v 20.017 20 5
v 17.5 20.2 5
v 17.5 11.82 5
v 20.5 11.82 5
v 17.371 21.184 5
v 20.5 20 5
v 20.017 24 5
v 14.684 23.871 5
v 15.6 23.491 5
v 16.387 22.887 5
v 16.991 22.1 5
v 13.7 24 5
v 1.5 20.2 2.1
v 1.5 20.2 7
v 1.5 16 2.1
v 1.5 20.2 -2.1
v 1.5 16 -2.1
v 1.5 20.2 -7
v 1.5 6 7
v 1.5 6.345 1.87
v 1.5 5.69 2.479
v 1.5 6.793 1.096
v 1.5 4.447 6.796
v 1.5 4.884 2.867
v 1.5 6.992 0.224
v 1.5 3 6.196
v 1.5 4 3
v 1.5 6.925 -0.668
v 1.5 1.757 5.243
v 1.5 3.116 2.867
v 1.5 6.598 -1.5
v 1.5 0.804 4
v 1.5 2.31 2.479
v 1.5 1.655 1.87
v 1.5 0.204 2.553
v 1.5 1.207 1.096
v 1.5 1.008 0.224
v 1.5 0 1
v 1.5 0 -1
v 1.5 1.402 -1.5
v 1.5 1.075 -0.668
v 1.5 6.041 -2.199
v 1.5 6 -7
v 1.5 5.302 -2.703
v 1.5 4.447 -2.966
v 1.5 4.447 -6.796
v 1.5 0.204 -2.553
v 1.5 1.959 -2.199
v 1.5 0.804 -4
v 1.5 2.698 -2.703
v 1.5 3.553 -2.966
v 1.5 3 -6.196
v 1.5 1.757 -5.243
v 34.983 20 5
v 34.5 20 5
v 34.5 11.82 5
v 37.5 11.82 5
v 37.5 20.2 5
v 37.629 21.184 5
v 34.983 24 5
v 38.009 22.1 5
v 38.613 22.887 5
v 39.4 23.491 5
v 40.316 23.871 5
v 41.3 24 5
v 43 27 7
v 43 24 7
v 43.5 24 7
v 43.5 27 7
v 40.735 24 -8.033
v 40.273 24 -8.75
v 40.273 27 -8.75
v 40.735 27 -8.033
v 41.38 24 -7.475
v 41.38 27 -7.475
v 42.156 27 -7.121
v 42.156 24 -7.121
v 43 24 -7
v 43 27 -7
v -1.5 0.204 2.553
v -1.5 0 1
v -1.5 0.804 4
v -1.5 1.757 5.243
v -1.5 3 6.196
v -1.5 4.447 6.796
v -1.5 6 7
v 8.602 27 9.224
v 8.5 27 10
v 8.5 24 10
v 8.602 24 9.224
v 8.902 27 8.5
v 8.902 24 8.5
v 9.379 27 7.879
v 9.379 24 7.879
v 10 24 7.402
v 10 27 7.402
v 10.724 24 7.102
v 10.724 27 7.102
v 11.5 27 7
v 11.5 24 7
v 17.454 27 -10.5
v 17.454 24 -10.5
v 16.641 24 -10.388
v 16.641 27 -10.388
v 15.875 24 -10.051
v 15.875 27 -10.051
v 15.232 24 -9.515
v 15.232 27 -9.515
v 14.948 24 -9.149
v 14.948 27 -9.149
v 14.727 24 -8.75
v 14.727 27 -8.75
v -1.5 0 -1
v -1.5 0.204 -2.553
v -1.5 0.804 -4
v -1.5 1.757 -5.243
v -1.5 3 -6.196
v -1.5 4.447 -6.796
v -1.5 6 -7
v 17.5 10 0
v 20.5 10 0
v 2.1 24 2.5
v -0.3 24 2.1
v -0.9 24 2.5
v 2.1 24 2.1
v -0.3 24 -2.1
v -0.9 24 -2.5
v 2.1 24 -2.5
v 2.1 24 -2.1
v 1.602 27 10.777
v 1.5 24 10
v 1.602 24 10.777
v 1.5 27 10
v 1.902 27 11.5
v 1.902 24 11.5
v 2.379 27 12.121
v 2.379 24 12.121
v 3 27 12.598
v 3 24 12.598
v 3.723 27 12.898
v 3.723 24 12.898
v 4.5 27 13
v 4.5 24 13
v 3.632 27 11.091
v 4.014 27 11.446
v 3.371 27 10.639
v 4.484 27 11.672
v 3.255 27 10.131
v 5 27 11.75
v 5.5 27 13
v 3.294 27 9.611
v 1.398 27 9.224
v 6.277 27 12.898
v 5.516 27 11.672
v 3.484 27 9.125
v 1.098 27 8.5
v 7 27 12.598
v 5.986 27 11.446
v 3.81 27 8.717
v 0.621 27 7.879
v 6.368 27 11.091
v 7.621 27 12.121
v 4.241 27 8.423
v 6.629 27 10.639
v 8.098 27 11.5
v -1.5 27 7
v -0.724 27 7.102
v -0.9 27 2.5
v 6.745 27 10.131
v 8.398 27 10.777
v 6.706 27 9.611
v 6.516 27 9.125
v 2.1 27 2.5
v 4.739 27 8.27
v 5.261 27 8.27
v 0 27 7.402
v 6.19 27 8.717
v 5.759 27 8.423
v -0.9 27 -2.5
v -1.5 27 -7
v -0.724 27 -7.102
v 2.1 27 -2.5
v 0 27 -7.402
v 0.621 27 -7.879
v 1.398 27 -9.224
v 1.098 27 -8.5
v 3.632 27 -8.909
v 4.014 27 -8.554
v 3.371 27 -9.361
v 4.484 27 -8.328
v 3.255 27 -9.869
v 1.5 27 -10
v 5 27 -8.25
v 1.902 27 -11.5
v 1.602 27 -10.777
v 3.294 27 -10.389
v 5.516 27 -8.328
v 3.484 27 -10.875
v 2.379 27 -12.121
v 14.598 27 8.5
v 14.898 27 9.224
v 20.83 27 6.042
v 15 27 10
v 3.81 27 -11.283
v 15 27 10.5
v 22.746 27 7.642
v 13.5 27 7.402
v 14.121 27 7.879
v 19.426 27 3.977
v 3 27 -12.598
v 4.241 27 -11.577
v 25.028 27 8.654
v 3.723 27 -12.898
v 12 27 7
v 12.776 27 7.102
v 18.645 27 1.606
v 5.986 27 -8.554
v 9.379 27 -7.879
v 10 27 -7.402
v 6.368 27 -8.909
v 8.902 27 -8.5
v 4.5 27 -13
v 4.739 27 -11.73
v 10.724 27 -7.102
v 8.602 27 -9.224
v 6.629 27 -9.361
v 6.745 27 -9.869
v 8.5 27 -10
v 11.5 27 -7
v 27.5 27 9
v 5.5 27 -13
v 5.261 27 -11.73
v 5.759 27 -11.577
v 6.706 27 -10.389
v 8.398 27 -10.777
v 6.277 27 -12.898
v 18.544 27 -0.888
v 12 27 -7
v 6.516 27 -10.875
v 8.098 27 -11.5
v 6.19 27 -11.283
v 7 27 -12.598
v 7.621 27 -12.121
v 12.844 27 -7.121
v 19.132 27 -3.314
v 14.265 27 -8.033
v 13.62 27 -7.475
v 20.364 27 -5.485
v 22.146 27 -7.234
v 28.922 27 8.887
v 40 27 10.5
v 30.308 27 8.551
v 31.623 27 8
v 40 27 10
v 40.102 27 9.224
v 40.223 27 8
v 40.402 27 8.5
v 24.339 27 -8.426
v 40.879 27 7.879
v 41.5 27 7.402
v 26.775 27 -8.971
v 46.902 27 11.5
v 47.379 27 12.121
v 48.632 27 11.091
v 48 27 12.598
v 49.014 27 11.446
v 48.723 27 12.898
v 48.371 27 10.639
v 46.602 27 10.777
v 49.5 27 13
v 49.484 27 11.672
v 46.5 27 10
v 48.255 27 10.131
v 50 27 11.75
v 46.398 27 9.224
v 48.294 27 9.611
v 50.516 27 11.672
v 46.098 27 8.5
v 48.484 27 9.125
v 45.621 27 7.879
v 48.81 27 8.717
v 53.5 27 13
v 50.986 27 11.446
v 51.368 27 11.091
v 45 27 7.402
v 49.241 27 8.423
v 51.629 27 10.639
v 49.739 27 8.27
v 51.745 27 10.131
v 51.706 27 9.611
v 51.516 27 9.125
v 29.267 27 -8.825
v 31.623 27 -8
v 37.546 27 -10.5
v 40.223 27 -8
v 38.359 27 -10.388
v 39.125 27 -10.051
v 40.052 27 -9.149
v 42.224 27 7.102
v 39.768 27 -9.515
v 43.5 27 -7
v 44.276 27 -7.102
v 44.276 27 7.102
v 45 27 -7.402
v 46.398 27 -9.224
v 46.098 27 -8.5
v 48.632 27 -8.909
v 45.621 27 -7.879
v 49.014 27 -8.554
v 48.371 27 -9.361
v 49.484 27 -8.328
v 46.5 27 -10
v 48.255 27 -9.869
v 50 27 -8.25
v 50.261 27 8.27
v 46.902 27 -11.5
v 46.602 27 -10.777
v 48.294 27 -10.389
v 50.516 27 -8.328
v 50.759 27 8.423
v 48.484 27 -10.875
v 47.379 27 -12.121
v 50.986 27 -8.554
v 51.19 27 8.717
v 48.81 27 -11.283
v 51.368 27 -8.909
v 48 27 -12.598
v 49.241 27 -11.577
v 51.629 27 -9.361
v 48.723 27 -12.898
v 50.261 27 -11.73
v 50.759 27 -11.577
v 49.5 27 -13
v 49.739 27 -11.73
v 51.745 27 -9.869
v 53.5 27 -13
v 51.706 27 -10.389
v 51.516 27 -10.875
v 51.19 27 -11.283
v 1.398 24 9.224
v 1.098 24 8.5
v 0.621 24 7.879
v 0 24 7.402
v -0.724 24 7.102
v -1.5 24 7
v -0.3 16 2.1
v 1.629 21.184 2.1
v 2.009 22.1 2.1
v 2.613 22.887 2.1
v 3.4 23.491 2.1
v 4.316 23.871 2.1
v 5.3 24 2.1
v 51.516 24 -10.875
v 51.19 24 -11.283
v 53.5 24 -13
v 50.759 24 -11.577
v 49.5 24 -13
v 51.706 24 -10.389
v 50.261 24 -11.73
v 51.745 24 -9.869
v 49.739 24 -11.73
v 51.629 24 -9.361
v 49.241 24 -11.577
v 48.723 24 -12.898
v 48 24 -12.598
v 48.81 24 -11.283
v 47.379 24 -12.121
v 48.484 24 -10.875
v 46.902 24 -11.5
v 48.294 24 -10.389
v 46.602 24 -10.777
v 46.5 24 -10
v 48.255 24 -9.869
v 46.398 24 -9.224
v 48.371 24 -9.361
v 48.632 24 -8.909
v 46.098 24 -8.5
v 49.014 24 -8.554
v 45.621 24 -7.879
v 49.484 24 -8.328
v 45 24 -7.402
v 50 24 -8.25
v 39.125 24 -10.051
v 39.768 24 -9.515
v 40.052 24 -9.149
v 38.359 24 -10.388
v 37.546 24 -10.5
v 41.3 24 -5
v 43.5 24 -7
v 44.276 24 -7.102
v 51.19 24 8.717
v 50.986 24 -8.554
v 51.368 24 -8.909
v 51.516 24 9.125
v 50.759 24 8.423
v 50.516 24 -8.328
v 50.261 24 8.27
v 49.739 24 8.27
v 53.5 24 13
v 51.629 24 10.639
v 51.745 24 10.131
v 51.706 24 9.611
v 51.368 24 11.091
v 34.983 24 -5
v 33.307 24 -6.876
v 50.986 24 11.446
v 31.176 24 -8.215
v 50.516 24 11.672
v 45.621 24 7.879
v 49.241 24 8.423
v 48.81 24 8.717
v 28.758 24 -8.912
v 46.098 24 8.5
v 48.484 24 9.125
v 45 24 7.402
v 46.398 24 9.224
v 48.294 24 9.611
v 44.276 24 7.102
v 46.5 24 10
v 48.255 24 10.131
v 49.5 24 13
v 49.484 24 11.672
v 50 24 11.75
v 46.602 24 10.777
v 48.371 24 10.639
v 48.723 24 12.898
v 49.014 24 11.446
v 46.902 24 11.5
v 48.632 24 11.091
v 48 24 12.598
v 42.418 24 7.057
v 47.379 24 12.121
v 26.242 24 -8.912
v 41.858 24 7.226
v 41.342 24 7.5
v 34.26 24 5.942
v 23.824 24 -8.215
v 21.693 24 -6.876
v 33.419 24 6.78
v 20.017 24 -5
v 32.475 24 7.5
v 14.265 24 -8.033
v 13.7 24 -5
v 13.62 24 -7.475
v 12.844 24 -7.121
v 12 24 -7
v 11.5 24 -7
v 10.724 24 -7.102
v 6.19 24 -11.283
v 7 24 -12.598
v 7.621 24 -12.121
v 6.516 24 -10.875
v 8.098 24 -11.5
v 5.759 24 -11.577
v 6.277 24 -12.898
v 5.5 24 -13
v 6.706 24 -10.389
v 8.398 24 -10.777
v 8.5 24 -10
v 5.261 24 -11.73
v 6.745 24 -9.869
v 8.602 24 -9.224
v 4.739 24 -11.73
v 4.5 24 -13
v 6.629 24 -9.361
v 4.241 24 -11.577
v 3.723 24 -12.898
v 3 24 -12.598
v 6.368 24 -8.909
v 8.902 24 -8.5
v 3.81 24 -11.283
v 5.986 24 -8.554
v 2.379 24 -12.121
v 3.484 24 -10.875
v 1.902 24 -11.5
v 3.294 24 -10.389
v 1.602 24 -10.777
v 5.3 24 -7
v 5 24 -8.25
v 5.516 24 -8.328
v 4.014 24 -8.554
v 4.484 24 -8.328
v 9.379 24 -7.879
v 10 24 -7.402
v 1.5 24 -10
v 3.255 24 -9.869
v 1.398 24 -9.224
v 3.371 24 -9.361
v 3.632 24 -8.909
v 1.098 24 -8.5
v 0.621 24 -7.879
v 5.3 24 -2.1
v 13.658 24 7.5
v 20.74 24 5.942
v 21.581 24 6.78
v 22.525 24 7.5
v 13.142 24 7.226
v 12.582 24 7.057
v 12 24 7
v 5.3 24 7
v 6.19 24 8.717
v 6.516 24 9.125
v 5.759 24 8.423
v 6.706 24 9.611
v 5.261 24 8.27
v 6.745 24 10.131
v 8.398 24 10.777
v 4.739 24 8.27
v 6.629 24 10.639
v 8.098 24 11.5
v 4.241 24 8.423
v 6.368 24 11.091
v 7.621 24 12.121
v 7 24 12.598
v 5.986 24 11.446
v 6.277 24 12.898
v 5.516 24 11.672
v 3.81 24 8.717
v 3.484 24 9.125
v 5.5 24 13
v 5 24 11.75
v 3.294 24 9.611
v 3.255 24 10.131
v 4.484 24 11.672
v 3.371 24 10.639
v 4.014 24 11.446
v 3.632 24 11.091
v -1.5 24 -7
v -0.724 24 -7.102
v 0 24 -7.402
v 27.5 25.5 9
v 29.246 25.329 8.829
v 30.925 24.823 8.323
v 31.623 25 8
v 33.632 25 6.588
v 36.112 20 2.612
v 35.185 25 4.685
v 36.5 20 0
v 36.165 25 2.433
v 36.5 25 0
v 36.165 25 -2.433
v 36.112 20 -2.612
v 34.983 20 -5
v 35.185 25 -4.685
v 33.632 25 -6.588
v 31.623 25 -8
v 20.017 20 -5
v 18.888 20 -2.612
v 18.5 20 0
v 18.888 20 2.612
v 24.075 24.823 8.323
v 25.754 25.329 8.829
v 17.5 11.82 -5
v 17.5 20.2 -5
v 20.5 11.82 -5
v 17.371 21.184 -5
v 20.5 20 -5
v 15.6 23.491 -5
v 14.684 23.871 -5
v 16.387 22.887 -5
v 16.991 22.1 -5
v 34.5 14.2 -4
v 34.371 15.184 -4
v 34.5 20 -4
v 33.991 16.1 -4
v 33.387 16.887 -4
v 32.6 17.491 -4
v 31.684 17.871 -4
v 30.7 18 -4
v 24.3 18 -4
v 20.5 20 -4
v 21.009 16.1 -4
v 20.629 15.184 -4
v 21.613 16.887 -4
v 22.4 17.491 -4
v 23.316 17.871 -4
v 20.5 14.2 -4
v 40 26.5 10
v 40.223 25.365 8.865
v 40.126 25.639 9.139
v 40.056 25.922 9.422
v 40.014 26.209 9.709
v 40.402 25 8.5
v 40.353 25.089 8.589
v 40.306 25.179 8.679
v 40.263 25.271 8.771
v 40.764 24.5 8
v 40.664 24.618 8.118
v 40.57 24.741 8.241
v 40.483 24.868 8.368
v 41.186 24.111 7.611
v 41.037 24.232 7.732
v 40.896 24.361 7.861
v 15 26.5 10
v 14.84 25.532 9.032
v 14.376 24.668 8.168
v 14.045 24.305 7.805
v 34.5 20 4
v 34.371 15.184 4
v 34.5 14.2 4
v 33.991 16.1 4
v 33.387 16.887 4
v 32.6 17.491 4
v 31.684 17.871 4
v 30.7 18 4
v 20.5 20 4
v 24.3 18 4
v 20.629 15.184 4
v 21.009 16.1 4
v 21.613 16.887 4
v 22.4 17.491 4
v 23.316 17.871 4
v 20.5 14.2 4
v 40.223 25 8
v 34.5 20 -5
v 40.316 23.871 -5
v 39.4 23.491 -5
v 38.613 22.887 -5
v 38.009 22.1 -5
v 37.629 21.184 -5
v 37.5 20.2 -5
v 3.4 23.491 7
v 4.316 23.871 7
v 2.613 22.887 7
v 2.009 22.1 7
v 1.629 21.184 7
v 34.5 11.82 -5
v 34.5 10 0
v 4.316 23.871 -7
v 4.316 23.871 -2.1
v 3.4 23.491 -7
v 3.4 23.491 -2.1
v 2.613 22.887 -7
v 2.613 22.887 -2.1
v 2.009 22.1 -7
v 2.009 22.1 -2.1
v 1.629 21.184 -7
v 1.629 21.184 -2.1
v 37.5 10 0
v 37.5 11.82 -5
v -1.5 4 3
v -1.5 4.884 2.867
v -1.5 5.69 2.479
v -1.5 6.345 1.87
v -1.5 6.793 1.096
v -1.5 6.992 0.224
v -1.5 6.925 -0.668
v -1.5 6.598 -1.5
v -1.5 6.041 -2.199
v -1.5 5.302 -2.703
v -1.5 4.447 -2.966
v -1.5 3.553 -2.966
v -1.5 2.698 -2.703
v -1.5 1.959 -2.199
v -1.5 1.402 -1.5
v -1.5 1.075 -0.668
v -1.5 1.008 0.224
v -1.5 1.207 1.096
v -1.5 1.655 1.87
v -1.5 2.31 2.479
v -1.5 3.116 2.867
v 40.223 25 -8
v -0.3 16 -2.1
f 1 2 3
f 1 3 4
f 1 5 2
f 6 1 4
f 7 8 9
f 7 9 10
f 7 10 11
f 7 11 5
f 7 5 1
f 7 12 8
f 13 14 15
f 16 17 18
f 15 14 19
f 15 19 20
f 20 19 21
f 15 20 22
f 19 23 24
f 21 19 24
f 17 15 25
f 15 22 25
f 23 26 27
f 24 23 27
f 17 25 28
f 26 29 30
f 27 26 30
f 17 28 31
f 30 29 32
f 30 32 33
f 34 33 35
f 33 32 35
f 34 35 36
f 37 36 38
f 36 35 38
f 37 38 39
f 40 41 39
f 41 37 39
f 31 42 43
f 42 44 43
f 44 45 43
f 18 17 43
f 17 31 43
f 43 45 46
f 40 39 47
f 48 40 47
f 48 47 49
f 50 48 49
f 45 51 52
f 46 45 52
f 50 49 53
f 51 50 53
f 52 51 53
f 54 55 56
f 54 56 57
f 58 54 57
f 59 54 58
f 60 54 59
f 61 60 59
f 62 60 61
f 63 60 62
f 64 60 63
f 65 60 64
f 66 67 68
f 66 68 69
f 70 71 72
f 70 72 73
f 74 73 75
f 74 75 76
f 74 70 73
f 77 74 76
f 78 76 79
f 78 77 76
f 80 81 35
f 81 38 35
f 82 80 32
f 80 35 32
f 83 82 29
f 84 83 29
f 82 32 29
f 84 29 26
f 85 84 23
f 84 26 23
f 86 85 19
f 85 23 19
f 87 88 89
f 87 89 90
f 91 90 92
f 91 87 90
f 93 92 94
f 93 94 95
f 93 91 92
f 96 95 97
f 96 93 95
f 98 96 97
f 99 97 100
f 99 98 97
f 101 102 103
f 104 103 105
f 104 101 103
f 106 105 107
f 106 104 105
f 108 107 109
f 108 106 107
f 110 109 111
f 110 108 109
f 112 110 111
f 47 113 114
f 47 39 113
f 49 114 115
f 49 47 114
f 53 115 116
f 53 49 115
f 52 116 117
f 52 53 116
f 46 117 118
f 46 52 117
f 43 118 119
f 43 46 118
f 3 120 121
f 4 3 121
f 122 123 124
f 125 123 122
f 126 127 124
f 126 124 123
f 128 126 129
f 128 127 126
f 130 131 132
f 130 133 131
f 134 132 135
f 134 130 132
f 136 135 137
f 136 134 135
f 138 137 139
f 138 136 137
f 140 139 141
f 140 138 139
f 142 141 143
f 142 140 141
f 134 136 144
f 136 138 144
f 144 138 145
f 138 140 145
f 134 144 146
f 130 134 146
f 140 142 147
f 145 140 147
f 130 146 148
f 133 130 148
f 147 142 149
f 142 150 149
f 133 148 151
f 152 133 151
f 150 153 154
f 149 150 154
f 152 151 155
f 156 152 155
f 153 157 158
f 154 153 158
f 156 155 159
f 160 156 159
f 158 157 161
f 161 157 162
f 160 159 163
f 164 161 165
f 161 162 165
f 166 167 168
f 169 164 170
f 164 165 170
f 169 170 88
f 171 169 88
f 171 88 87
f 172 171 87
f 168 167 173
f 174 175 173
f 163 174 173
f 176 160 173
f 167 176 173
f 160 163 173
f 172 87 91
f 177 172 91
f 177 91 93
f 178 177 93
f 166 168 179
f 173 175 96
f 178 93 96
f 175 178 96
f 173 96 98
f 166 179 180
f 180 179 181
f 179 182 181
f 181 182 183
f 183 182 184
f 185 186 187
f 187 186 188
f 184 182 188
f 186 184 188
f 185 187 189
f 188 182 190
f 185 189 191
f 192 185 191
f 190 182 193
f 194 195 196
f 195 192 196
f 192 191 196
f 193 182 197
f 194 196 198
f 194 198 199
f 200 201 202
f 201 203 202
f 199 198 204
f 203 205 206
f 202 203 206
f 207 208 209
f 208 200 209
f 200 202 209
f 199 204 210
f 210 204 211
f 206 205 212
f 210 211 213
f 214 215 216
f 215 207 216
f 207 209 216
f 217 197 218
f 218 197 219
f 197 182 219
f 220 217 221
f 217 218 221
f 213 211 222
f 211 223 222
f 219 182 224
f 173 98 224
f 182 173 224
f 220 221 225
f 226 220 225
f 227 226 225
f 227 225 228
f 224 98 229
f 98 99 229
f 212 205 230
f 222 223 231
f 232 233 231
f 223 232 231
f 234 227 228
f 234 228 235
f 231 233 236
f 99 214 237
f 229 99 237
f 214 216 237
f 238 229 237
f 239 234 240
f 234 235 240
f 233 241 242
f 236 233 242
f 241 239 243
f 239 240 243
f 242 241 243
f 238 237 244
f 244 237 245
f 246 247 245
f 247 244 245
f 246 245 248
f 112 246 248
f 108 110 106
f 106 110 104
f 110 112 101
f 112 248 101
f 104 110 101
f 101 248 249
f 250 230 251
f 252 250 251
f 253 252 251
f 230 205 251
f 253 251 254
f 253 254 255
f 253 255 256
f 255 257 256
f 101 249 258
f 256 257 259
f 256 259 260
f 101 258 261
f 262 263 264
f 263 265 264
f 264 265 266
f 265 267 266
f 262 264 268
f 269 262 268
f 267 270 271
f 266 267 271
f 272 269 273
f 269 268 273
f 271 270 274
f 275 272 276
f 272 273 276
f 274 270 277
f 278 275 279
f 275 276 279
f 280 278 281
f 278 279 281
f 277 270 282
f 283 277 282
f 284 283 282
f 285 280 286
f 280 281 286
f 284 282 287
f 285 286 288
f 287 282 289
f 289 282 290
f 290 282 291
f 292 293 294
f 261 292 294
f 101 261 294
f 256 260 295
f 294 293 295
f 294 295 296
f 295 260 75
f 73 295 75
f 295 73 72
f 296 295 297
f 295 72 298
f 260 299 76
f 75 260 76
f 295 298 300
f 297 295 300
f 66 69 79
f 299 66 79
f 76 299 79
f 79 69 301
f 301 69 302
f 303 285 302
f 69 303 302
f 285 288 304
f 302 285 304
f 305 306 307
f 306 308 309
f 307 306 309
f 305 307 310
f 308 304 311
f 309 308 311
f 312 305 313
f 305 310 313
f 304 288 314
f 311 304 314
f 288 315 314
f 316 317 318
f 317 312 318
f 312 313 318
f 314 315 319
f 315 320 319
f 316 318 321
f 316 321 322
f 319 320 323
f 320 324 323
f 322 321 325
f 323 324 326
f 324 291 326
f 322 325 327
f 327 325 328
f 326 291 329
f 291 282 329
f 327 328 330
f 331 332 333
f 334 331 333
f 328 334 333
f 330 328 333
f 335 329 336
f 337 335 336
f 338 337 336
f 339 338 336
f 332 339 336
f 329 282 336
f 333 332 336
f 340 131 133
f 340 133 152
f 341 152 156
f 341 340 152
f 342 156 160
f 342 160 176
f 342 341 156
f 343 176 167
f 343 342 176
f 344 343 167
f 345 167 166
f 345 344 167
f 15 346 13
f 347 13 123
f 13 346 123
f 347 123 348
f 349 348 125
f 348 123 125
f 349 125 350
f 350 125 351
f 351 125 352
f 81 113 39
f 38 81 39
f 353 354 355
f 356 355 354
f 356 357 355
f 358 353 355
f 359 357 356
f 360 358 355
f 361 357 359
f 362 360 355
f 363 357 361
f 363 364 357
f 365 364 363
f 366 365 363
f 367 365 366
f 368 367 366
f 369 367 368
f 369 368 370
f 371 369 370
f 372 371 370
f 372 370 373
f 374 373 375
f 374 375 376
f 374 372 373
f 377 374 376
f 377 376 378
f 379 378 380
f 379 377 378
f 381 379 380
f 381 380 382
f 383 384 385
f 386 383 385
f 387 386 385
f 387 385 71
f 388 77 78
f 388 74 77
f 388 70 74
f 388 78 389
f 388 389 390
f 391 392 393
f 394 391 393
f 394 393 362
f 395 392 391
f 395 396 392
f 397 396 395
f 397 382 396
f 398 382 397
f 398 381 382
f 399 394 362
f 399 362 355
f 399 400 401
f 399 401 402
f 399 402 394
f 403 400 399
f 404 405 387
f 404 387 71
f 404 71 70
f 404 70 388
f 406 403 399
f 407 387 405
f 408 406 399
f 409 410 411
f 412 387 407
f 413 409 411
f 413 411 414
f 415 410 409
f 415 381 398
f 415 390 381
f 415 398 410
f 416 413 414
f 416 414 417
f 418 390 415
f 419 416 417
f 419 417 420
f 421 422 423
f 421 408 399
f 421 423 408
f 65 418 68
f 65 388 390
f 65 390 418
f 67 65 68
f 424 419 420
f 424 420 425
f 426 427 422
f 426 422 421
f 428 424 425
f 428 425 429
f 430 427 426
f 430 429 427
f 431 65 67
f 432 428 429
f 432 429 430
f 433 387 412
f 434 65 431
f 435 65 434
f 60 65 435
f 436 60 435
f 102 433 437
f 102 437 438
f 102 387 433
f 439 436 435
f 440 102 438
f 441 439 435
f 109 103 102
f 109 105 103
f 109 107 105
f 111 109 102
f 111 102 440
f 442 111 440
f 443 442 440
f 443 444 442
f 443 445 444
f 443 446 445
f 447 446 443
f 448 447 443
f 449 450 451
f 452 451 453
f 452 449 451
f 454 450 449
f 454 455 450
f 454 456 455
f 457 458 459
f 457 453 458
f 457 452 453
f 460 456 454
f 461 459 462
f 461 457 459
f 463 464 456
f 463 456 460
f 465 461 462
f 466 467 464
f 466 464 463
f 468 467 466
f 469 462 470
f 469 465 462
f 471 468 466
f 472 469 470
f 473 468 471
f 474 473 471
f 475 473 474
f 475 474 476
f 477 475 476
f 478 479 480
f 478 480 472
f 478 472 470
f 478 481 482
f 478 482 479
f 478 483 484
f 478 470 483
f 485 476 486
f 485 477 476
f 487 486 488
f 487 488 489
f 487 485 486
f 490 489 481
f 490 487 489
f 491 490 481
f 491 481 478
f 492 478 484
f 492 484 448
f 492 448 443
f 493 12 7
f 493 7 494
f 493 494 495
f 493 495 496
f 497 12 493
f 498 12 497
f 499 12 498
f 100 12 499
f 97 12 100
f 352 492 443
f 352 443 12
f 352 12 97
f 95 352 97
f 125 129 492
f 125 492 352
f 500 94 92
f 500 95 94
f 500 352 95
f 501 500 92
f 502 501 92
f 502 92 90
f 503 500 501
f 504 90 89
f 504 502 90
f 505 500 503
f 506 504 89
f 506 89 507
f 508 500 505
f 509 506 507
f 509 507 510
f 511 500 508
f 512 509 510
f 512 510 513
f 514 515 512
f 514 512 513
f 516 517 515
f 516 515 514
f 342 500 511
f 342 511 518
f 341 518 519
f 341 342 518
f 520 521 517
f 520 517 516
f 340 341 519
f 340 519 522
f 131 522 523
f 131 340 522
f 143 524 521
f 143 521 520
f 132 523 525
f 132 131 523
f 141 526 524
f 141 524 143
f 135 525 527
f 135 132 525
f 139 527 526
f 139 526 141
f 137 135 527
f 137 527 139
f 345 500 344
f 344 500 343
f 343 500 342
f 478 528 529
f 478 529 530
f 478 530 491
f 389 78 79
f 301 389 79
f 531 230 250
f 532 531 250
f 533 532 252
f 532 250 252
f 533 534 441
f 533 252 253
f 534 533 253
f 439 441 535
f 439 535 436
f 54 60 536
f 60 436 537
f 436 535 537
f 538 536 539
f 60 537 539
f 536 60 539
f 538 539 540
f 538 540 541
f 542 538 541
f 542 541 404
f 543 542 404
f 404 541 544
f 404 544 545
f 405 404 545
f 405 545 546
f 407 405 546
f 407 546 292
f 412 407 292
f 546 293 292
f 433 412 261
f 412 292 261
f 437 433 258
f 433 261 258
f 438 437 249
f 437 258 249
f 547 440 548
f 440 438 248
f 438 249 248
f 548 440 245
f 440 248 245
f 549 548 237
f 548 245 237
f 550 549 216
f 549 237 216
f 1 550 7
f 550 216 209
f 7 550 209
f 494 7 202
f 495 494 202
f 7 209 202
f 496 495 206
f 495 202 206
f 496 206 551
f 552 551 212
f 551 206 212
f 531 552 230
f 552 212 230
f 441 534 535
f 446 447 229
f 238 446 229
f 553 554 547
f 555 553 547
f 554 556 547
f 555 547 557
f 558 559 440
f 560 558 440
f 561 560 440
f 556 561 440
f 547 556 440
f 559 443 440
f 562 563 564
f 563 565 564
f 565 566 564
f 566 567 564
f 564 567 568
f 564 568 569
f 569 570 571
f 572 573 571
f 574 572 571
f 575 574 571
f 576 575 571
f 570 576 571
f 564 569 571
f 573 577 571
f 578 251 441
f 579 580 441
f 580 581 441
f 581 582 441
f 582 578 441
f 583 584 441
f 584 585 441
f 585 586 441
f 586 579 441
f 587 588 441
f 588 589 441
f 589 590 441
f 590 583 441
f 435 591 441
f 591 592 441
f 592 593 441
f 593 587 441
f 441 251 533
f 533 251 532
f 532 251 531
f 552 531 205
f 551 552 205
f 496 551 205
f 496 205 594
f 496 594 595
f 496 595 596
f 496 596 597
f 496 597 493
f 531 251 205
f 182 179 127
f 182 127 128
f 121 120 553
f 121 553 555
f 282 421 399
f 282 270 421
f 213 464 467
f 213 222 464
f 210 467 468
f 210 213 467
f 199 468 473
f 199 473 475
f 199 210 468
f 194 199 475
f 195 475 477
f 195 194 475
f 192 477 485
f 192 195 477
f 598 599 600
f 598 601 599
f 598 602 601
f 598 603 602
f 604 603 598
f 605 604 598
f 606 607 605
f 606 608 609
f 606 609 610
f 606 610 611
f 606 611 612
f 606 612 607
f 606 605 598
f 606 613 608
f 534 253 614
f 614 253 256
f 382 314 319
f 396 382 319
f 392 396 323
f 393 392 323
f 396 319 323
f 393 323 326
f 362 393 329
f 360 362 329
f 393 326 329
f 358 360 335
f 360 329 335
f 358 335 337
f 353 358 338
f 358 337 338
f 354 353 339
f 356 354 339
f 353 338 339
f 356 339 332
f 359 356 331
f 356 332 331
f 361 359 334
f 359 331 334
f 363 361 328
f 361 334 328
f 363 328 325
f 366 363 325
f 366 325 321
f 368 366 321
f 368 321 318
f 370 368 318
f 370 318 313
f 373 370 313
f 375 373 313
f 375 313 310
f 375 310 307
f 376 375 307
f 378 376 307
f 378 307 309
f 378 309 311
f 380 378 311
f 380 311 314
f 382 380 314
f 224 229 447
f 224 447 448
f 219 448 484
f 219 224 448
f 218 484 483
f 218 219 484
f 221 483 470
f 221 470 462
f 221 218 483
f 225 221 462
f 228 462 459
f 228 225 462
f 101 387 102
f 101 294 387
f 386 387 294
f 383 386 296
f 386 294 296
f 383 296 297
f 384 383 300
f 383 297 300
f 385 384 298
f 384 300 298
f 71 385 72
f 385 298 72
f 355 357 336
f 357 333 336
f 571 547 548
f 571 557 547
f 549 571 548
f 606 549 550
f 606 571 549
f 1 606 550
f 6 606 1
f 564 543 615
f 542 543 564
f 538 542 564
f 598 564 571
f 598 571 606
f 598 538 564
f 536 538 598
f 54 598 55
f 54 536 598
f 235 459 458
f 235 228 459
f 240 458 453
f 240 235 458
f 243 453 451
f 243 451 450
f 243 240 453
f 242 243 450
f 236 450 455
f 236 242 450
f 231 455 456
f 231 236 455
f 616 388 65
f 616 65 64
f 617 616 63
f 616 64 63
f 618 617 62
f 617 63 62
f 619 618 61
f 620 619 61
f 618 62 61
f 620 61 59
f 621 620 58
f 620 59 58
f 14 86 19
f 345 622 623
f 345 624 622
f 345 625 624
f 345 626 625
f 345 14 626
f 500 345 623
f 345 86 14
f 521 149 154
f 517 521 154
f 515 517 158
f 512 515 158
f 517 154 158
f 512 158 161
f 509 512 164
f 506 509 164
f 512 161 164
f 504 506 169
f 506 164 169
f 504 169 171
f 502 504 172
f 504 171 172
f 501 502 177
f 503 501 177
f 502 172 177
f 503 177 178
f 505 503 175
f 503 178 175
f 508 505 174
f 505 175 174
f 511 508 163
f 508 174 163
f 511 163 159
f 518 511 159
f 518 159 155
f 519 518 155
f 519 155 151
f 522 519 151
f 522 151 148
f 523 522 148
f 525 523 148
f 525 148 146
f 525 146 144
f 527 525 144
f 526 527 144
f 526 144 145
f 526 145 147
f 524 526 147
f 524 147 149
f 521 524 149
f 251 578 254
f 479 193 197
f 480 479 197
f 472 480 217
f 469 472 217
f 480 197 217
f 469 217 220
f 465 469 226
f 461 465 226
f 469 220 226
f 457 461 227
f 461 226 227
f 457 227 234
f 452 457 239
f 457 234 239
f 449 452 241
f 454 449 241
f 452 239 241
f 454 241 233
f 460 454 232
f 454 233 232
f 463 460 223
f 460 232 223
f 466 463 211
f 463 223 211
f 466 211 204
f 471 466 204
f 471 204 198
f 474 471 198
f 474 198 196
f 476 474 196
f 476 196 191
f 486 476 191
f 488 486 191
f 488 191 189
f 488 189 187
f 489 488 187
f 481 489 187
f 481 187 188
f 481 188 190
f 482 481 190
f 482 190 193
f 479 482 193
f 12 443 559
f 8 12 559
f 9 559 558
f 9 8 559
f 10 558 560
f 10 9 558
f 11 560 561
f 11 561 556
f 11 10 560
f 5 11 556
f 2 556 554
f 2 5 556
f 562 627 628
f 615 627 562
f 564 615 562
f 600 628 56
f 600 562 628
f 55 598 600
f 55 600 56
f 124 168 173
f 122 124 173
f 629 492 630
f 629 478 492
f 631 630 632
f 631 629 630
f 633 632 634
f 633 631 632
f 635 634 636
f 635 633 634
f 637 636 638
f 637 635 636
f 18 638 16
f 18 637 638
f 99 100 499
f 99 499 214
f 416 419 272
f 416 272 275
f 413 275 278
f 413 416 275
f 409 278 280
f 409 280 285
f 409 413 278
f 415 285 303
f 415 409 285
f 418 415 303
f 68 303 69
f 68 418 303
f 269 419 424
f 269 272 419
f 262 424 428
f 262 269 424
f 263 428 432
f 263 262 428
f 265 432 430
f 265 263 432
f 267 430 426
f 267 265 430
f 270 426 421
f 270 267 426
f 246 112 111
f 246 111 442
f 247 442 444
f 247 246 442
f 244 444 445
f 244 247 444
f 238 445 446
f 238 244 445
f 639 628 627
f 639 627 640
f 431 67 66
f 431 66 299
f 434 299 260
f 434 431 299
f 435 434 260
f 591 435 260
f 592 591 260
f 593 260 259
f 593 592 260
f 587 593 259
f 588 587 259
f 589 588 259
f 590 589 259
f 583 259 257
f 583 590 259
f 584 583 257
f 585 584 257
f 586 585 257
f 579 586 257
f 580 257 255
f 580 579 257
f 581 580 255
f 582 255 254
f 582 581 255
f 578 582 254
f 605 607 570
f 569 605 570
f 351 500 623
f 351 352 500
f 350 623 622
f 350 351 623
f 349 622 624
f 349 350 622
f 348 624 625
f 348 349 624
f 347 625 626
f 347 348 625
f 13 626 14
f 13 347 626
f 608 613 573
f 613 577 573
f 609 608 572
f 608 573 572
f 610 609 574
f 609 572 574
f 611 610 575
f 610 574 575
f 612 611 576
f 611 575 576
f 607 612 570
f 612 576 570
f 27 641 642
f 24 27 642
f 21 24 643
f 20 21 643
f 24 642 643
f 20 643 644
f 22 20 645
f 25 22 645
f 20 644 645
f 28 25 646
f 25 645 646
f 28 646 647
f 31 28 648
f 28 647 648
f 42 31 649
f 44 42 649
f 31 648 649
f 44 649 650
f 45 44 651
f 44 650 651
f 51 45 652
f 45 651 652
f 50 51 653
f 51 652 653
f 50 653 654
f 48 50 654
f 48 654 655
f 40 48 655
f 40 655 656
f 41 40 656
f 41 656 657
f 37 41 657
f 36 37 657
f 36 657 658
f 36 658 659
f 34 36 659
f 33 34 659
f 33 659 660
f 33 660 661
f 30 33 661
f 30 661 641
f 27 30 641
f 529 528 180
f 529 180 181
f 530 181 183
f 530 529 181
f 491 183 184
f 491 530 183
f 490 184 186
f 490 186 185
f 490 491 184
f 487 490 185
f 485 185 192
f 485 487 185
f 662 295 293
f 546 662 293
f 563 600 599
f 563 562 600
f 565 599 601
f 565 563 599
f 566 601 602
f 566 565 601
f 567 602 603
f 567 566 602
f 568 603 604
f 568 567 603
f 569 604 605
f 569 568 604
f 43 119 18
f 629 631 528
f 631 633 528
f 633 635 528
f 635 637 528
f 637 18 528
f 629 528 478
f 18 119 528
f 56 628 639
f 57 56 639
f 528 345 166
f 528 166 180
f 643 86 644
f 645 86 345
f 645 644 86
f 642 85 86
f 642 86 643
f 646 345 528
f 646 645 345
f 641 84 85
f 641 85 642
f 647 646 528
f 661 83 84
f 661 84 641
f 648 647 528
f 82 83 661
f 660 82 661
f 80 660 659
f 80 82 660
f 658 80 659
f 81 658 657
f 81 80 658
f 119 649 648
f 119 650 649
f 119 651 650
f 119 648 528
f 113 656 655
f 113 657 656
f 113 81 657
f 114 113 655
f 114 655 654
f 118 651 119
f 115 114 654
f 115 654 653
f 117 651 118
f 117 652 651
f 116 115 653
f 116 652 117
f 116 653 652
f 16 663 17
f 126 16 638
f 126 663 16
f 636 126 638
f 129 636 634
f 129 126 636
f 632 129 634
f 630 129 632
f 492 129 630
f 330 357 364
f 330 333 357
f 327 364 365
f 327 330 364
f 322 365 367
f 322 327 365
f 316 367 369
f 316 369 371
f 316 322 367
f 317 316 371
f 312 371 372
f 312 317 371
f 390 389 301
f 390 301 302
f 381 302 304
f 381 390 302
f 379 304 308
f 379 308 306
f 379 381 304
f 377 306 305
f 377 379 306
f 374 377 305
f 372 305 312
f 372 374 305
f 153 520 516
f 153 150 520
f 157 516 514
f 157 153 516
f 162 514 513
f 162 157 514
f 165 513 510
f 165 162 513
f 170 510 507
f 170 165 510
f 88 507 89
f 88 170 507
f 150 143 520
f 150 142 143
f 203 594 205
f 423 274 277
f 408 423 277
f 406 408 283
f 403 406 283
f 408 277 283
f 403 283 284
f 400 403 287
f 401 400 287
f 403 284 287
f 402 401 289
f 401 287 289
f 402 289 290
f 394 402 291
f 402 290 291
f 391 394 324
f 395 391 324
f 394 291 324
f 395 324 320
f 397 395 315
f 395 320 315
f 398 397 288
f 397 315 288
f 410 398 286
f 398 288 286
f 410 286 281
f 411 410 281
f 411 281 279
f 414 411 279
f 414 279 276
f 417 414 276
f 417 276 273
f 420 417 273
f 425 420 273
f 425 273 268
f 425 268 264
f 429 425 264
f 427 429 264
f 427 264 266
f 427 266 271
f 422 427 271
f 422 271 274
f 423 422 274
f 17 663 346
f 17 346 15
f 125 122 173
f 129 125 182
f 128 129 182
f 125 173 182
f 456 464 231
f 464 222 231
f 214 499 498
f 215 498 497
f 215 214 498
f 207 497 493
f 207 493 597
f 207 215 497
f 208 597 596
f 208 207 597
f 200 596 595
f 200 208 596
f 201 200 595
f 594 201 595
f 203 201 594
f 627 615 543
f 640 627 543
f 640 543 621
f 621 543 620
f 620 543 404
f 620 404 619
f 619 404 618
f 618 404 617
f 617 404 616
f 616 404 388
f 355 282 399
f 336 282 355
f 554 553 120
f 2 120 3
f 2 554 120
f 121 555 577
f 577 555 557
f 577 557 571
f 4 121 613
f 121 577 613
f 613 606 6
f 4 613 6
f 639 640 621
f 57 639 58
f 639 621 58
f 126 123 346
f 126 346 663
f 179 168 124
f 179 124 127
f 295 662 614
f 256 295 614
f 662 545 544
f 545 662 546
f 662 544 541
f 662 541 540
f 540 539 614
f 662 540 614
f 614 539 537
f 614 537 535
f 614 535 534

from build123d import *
from OCP.BRepFilletAPI import BRepFilletAPI_MakeChamfer

# Parameters (mm, degrees)
SKETCH1_W           = 3
SKETCH1_H           = 14
BOSS_EXTRUDE1_DEPTH = 27
SKETCH2_R           = 3
CUT_EXTRUDE1_DEPTH  = 29.053520278
SKETCH3_W           = 14
SKETCH3_H           = 3
BOSS_EXTRUDE2_DEPTH = 52
SKETCH4_W           = 3
SKETCH4_H           = 10
BOSS_EXTRUDE3_DEPTH = 14
CHAMFER1_SIZE       = 1.819851171
CHAMFER1_SIZE_2     = 5
SKETCH6_W           = 25
SKETCH6_H           = 3
BOSS_EXTRUDE5_DEPTH = 3.5
SKETCH5_W           = 7
SKETCH5_H           = 3
BOSS_EXTRUDE4_DEPTH = 6
SKETCH7_R           = 9
CUT_EXTRUDE2_DEPTH  = 7
CHAMFER2_SIZE       = 3
SKETCH8_W           = 8
SKETCH8_H           = 2
BOSS_EXTRUDE6_DEPTH = 14
SKETCH9_W           = 8.6
SKETCH9_H           = 16
CUT_EXTRUDE3_DEPTH  = 2
CUT_EXTRUDE4_REACH  = 63.321
SKETCH10_R          = 1.75
SKETCH11_W          = 1.8
SKETCH11_H          = 4.2
CUT_EXTRUDE5_DEPTH  = 11
FILLET1_R           = 3
FILLET2_R           = 3
FILLET3_R           = 3.8
FILLET4_R           = 6
SKETCH12_W          = 3
SKETCH12_H          = 5
CUT_EXTRUDE6_DEPTH  = 3


# Some blends are built 0.0001 mm under size
with BuildPart() as part:
    # Sketch1 → Boss-Extrude1 (new body)
    with BuildSketch(Plane(origin=(0, 0, 0), x_dir=(1, 0, 0), z_dir=(0, 1, 0))):
        Rectangle(SKETCH1_W, SKETCH1_H)
    extrude(amount=BOSS_EXTRUDE1_DEPTH)

    # Sketch2 → Cut-Extrude1 (cut, through all)
    with BuildSketch(Plane.ZY.offset(1.5)):
        with Locations((0, 4)):
            Circle(SKETCH2_R)
    extrude(amount=-CUT_EXTRUDE1_DEPTH, mode=Mode.SUBTRACT)

    # Sketch3 → Boss-Extrude2 (add)
    with BuildSketch(Plane(origin=(1.5, 0, 0), x_dir=(0, 0, -1), z_dir=(1, 0, 0))):
        with Locations((0, 25.5)):
            Rectangle(SKETCH3_W, SKETCH3_H)
    extrude(amount=BOSS_EXTRUDE2_DEPTH)

    # Sketch4 → Boss-Extrude3 (add)
    with BuildSketch(Plane.XZ.offset(-24)):
        with Locations((36, 0)):
            Rectangle(SKETCH4_W, SKETCH4_H)
        with Locations((19, 0)):
            Rectangle(SKETCH4_W, SKETCH4_H)
    extrude(amount=BOSS_EXTRUDE3_DEPTH)

    # Chamfer1
    chamfer1_edges_1 = [part.edges().sort_by_distance(p)[0] for p in [
        (36, 10, -5),
    ]]
    chamfer1_side_1 = [part.faces().sort_by_distance(p)[0] for p in [
        (36, 10.036397023, -5),
    ]]
    chamfer1_edges_2 = [part.edges().sort_by_distance(p)[0] for p in [
        (36, 10, 5),
    ]]
    chamfer1_side_2 = [part.faces().sort_by_distance(p)[0] for p in [
        (36, 10.036397023, 5),
    ]]
    chamfer1_edges_3 = [part.edges().sort_by_distance(p)[0] for p in [
        (19, 10, 5),
    ]]
    chamfer1_side_3 = [part.faces().sort_by_distance(p)[0] for p in [
        (19, 10.036397023, 5),
    ]]
    chamfer1_edges_4 = [part.edges().sort_by_distance(p)[0] for p in [
        (19, 10, -5),
    ]]
    chamfer1_side_4 = [part.faces().sort_by_distance(p)[0] for p in [
        (19, 10.036397023, -5),
    ]]
    chamfer1 = BRepFilletAPI_MakeChamfer(part.part.solid().wrapped)
    for e in chamfer1_edges_1:
        chamfer1.Add(CHAMFER1_SIZE - 0.0001, CHAMFER1_SIZE_2 - 0.0001, e.wrapped, chamfer1_side_1[0].wrapped)
    for e in chamfer1_edges_2:
        chamfer1.Add(CHAMFER1_SIZE - 0.0001, CHAMFER1_SIZE_2 - 0.0001, e.wrapped, chamfer1_side_2[0].wrapped)
    for e in chamfer1_edges_3:
        chamfer1.Add(CHAMFER1_SIZE - 0.0001, CHAMFER1_SIZE_2 - 0.0001, e.wrapped, chamfer1_side_3[0].wrapped)
    for e in chamfer1_edges_4:
        chamfer1.Add(CHAMFER1_SIZE - 0.0001, CHAMFER1_SIZE_2 - 0.0001, e.wrapped, chamfer1_side_4[0].wrapped)
    add(Compound.cast(chamfer1.Shape()), mode=Mode.REPLACE)  # a hair under: the kernel refuses the full size

    # Sketch6 → Boss-Extrude5 (add)
    with BuildSketch(Plane(origin=(0, 0, -7), x_dir=(-1, 0, 0), z_dir=(0, 0, -1))):
        with Locations((-27.5, 25.5)):
            Rectangle(SKETCH6_W, SKETCH6_H)
    boss_extrude5 = extrude(amount=BOSS_EXTRUDE5_DEPTH)

    # Sketch5 → Boss-Extrude4 (add)
    with BuildSketch(Plane.XY.offset(7)):
        with Locations((5, 25.5)):
            Rectangle(SKETCH5_W, SKETCH5_H)
        with Locations((50, 25.5)):
            Rectangle(SKETCH5_W, SKETCH5_H)
    boss_extrude4 = extrude(amount=BOSS_EXTRUDE4_DEPTH)

    # Mirror1: Boss-Extrude5, Boss-Extrude4 across plane
    add(boss_extrude5.mirror(Plane.XY))
    add(boss_extrude4.mirror(Plane.XY))

    # Sketch7 → Cut-Extrude2 (cut)
    with BuildSketch(Plane(origin=(0, 27, 0), x_dir=(1, 0, 0), z_dir=(0, 1, 0))):
        with Locations(Location((27.5, 0, 0), (0, 0, 270))):
            Circle(SKETCH7_R)
    extrude(amount=-CUT_EXTRUDE2_DEPTH, mode=Mode.SUBTRACT)

    # Chamfer2
    # the kernel refuses this chamfer: 3 mm, written as the material it takes off along each edge
    with BuildSketch(Plane(origin=(15, 24, 10.5), x_dir=(0, -0.027495876610586757, -0.9996219169112968), z_dir=(1, 0, 0))) as chamfer2_piece_1:
        Polygon((CHAMFER2_SIZE * 0.999621916911, CHAMFER2_SIZE * 0.0274958766106), (-CHAMFER2_SIZE * 0.0274958766106, CHAMFER2_SIZE * 0.999621916911), (0, 0), align=None)
    extrude(amount=25, mode=Mode.SUBTRACT)

    # Sketch8 → Boss-Extrude6 (add)
    with BuildSketch(Plane(origin=(20.5, 0, 0), x_dir=(0, 0, -1), z_dir=(1, 0, 0))):
        with Locations((0, 19)):
            Rectangle(SKETCH8_W, SKETCH8_H)
    extrude(amount=BOSS_EXTRUDE6_DEPTH)

    # Sketch9 → Cut-Extrude3 (cut)
    with BuildSketch(Plane(origin=(0, 27, 0), x_dir=(1, 0, 0), z_dir=(0, 1, 0))):
        with Locations((35.923105626, 0)):
            Rectangle(SKETCH9_W, SKETCH9_H)
    extrude(amount=-CUT_EXTRUDE3_DEPTH, mode=Mode.SUBTRACT)

    # Sketch10 → Cut-Extrude4 (cut, up to next)
    with BuildSketch(Plane(origin=(0, 27, 0), x_dir=(1, 0, 0), z_dir=(0, 1, 0)), mode=Mode.PRIVATE) as cut_extrude4_sk1:
        with Locations(Location((5, -10, 0), (0, 0, 270))):
            Circle(SKETCH10_R)
    cut_extrude4_tool1 = extrude(cut_extrude4_sk1.sketch, amount=-CUT_EXTRUDE4_REACH, mode=Mode.PRIVATE) & part.part
    # Sketch10 → Cut-Extrude4 (cut, up to next)
    with BuildSketch(Plane(origin=(0, 27, 0), x_dir=(1, 0, 0), z_dir=(0, 1, 0)), mode=Mode.PRIVATE) as cut_extrude4_sk2:
        with Locations(Location((50, -10, 0), (0, 0, 270))):
            Circle(SKETCH10_R)
    cut_extrude4_tool2 = extrude(cut_extrude4_sk2.sketch, amount=-CUT_EXTRUDE4_REACH, mode=Mode.PRIVATE) & part.part
    # Sketch10 → Cut-Extrude4 (cut, up to next)
    with BuildSketch(Plane(origin=(0, 27, 0), x_dir=(1, 0, 0), z_dir=(0, 1, 0)), mode=Mode.PRIVATE) as cut_extrude4_sk3:
        with Locations(Location((50, 10, 0), (0, 0, 270))):
            Circle(SKETCH10_R)
    cut_extrude4_tool3 = extrude(cut_extrude4_sk3.sketch, amount=-CUT_EXTRUDE4_REACH, mode=Mode.PRIVATE) & part.part
    # Sketch10 → Cut-Extrude4 (cut, up to next)
    with BuildSketch(Plane(origin=(0, 27, 0), x_dir=(1, 0, 0), z_dir=(0, 1, 0)), mode=Mode.PRIVATE) as cut_extrude4_sk4:
        with Locations(Location((5, 10, 0), (0, 0, 270))):
            Circle(SKETCH10_R)
    cut_extrude4_tool4 = extrude(cut_extrude4_sk4.sketch, amount=-CUT_EXTRUDE4_REACH, mode=Mode.PRIVATE) & part.part
    add(cut_extrude4_tool1.solids().sort_by_distance((5, 27, 10))[0], mode=Mode.SUBTRACT)
    add(cut_extrude4_tool2.solids().sort_by_distance((50, 27, 10))[0], mode=Mode.SUBTRACT)
    add(cut_extrude4_tool3.solids().sort_by_distance((50, 27, -10))[0], mode=Mode.SUBTRACT)
    add(cut_extrude4_tool4.solids().sort_by_distance((5, 27, -10))[0], mode=Mode.SUBTRACT)

    # Sketch11 → Cut-Extrude5 (cut)
    with BuildSketch(Plane(origin=(0, 27, 0), x_dir=(1, 0, 0), z_dir=(0, 1, 0))):
        with Locations((0.6, 0)):
            Rectangle(SKETCH11_W, SKETCH11_H)
    extrude(amount=-CUT_EXTRUDE5_DEPTH, mode=Mode.SUBTRACT)

    # Fillet1
    # the kernel refuses this fillet: 3 mm, written as the material it adds along each edge
    with BuildSketch(Plane(origin=(46.5, 24, 7), x_dir=(0, 0, 1), z_dir=(0, 1, 0)), Plane(origin=(8.5, 27, 7), x_dir=(0, 0, 1), z_dir=(0, -1, 0)), Plane(origin=(1.5, 24, 7), x_dir=(0, 0, 1), z_dir=(0, 1, 0)), Plane(origin=(46.5, 24, -7), x_dir=(-1, 0, 0), z_dir=(0, 1, 0))) as fillet1_piece_1:
        with BuildLine():
            CenterArc((FILLET1_R, -FILLET1_R), FILLET1_R, 90, 90)
            Line((0, -FILLET1_R), (0, 0))
            Line((0, 0), (FILLET1_R, 0))
        make_face()
    extrude(amount=3)
    with BuildSketch(Plane(origin=(40, 24, 7), x_dir=(1, 0, 0), z_dir=(0, 1, 0))) as fillet1_piece_2_section:
        with BuildLine():
            CenterArc((FILLET1_R, -FILLET1_R), FILLET1_R, 90, 90)
            Line((0, -FILLET1_R), (0, 0))
            Line((0, 0), (FILLET1_R, 0))
        make_face()
    fillet1_piece_2 = extrude(amount=8.5, mode=Mode.PRIVATE)
    fillet1_piece_2 = split(fillet1_piece_2, bisect_by=Plane(origin=(40.974089344, 24.187586332, 7.687586332), z_dir=(0, 0.7071067811862648, -0.7071067811868302)), keep=Keep.TOP, mode=Mode.PRIVATE)
    fillet1_piece_2 = split(fillet1_piece_2, bisect_by=Plane(origin=(40.974089344, 27, 7.348410065), z_dir=(0, -1, 0)), keep=Keep.TOP, mode=Mode.PRIVATE)
    fillet1_piece_2 = split(fillet1_piece_2, bisect_by=Plane(origin=(40.223105626, 24.526762599, 7.348410065), z_dir=(1, 0, 0)), keep=Keep.TOP, mode=Mode.PRIVATE)
    add(fillet1_piece_2)
    with BuildSketch(Plane(origin=(40, 24, 7), x_dir=(1, 0, 0), z_dir=(0, 1, 0))) as fillet1_piece_3_section:
        with BuildLine():
            CenterArc((FILLET1_R, -FILLET1_R), FILLET1_R, 90, 90)
            Line((0, -FILLET1_R), (0, 0))
            Line((0, 0), (FILLET1_R, 0))
        make_face()
    fillet1_piece_3 = extrude(amount=1, mode=Mode.PRIVATE)
    fillet1_piece_3 = split(fillet1_piece_3, bisect_by=Plane(origin=(40.111552813, 24.25, 7.75), z_dir=(0, 0.7071067811862648, -0.7071067811868302)), keep=Keep.TOP, mode=Mode.PRIVATE)
    add(fillet1_piece_3)
    with BuildSketch(Plane(origin=(40, 16.5, 7), x_dir=(1, 0, 0), z_dir=(0, 1, 0))) as fillet1_piece_4_section:
        with BuildLine():
            CenterArc((FILLET1_R, -FILLET1_R), FILLET1_R, 90, 90)
            Line((0, -FILLET1_R), (0, 0))
            Line((0, 0), (FILLET1_R, 0))
        make_face()
    fillet1_piece_4 = extrude(amount=16, mode=Mode.PRIVATE)
    fillet1_piece_4 = split(fillet1_piece_4, bisect_by=Plane(origin=(40.102150249, 25.589388324, 9.089388324), z_dir=(0, 0.7071067811862648, -0.7071067811868302)), keep=Keep.TOP, mode=Mode.PRIVATE)
    fillet1_piece_4 = split(fillet1_piece_4, bisect_by=Plane(origin=(40.102150249, 27, 8.580734209), z_dir=(0, -1, 0)), keep=Keep.TOP, mode=Mode.PRIVATE)
    fillet1_piece_4 = split(fillet1_piece_4, bisect_by=Plane(origin=(40.102150249, 26.098042439, 8), z_dir=(0, 0, 1)), keep=Keep.TOP, mode=Mode.PRIVATE)
    add(fillet1_piece_4)
    with BuildSketch(Plane(origin=(15, 27, 7), x_dir=(-1, 0, 0), z_dir=(0, -1, 0))) as fillet1_piece_5_section:
        with BuildLine():
            CenterArc((FILLET1_R, -FILLET1_R), FILLET1_R, 90, 90)
            Line((0, -FILLET1_R), (0, 0))
            Line((0, 0), (FILLET1_R, 0))
        make_face()
    fillet1_piece_5 = extrude(amount=3, mode=Mode.PRIVATE)
    fillet1_piece_5 = split(fillet1_piece_5, bisect_by=Plane(origin=(14.281357865, 24.846943588, 8.346943588), z_dir=(0, 0.7071067811862648, -0.7071067811868302)), keep=Keep.TOP, mode=Mode.PRIVATE)
    add(fillet1_piece_5)
    with BuildSketch(Plane(origin=(1.5, 24, -7), x_dir=(0, 0, -1), z_dir=(0, 1, 0)), Plane(origin=(8.5, 27, -7), x_dir=(0, 0, -1), z_dir=(0, -1, 0)), Plane(origin=(15, 27, -7), x_dir=(-1, 0, 0), z_dir=(0, -1, 0))) as fillet1_piece_6:
        with BuildLine():
            CenterArc((FILLET1_R, FILLET1_R), FILLET1_R, 180, 90)
            Line((0, FILLET1_R), (0, 0))
            Line((0, 0), (FILLET1_R, 0))
        make_face()
    extrude(amount=3)
    with BuildSketch(Plane(origin=(40, 24, -7), x_dir=(0, 0, -1), z_dir=(0, 1, 0))) as fillet1_piece_7_section:
        with BuildLine():
            CenterArc((FILLET1_R, -FILLET1_R), FILLET1_R, 90, 90)
            Line((0, -FILLET1_R), (0, 0))
            Line((0, 0), (FILLET1_R, 0))
        make_face()
    fillet1_piece_7 = extrude(amount=8.5, mode=Mode.PRIVATE)
    fillet1_piece_7 = split(fillet1_piece_7, bisect_by=Plane(origin=(40.097980222, 27, -8.647383522), z_dir=(0, -1, 0)), keep=Keep.TOP, mode=Mode.PRIVATE)
    fillet1_piece_7 = split(fillet1_piece_7, bisect_by=Plane(origin=(40.097980222, 24.5, -8), z_dir=(0, 0, -1)), keep=Keep.TOP, mode=Mode.PRIVATE)
    add(fillet1_piece_7)
    with BuildSketch(Plane(origin=(40, 24, -7), x_dir=(0, 0, -1), z_dir=(0, 1, 0))) as fillet1_piece_8:
        with BuildLine():
            CenterArc((FILLET1_R, -FILLET1_R), FILLET1_R, 90, 90)
            Line((0, -FILLET1_R), (0, 0))
            Line((0, 0), (FILLET1_R, 0))
        make_face()
    extrude(amount=1)
    with BuildSketch(Plane(origin=(40, 16.5, -7), x_dir=(0, 0, -1), z_dir=(0, 1, 0))) as fillet1_piece_9_section:
        with BuildLine():
            CenterArc((FILLET1_R, -FILLET1_R), FILLET1_R, 90, 90)
            Line((0, -FILLET1_R), (0, 0))
            Line((0, 0), (FILLET1_R, 0))
        make_face()
    fillet1_piece_9 = extrude(amount=16, mode=Mode.PRIVATE)
    fillet1_piece_9 = split(fillet1_piece_9, bisect_by=Plane(origin=(40.946316816, 27, -7.381877422), z_dir=(0, -1, 0)), keep=Keep.TOP, mode=Mode.PRIVATE)
    fillet1_piece_9 = split(fillet1_piece_9, bisect_by=Plane(origin=(40.946316816, 25, -7.381877422), z_dir=(0, 1, 0)), keep=Keep.TOP, mode=Mode.PRIVATE)
    fillet1_piece_9 = split(fillet1_piece_9, bisect_by=Plane(origin=(40.223105626, 26, -7.381877422), z_dir=(1, 0, 0)), keep=Keep.TOP, mode=Mode.PRIVATE)
    add(fillet1_piece_9)

    # Fillet2
    fillet2_edges = [part.edges().sort_by_distance(p)[0] for p in [
        (46.5, 25.5, 13),
        (46.5, 25.5, -13),
        (40, 25.5, -10.5),
        (15, 25.5, -10.5),
        (8.5, 25.5, 13),
        (1.5, 25.5, 13),
        (1.5, 25.5, -13),
        (8.5, 25.5, -13),
    ]]
    fillet(fillet2_edges, radius=FILLET2_R - 0.0001)  # a hair under: the kernel refuses the full size

    # Fillet3
    fillet3_edges = [part.edges().sort_by_distance(p)[0] for p in [
        (20.5, 18, 0),
        (34.5, 18, 0),
        (1.5, 24, 4.55),
        (1.5, 24, -4.55),
        (17.5, 24, 0),
        (37.5, 24, 0),
    ]]
    fillet(fillet3_edges, radius=FILLET3_R)

    # Fillet4
    fillet4_edges = [part.edges().sort_by_distance(p)[0] for p in [
        (0, 0, 7),
        (0, 0, -7),
    ]]
    fillet(fillet4_edges, radius=FILLET4_R)

    # Sketch12 → Cut-Extrude6 (cut)
    with BuildSketch(Plane(origin=(0, 27, 0), x_dir=(1, 0, 0), z_dir=(0, 1, 0))):
        with Locations((0.6, 0)):
            Rectangle(SKETCH12_W, SKETCH12_H)
    extrude(amount=-CUT_EXTRUDE6_DEPTH, mode=Mode.SUBTRACT)


solid = part.part
